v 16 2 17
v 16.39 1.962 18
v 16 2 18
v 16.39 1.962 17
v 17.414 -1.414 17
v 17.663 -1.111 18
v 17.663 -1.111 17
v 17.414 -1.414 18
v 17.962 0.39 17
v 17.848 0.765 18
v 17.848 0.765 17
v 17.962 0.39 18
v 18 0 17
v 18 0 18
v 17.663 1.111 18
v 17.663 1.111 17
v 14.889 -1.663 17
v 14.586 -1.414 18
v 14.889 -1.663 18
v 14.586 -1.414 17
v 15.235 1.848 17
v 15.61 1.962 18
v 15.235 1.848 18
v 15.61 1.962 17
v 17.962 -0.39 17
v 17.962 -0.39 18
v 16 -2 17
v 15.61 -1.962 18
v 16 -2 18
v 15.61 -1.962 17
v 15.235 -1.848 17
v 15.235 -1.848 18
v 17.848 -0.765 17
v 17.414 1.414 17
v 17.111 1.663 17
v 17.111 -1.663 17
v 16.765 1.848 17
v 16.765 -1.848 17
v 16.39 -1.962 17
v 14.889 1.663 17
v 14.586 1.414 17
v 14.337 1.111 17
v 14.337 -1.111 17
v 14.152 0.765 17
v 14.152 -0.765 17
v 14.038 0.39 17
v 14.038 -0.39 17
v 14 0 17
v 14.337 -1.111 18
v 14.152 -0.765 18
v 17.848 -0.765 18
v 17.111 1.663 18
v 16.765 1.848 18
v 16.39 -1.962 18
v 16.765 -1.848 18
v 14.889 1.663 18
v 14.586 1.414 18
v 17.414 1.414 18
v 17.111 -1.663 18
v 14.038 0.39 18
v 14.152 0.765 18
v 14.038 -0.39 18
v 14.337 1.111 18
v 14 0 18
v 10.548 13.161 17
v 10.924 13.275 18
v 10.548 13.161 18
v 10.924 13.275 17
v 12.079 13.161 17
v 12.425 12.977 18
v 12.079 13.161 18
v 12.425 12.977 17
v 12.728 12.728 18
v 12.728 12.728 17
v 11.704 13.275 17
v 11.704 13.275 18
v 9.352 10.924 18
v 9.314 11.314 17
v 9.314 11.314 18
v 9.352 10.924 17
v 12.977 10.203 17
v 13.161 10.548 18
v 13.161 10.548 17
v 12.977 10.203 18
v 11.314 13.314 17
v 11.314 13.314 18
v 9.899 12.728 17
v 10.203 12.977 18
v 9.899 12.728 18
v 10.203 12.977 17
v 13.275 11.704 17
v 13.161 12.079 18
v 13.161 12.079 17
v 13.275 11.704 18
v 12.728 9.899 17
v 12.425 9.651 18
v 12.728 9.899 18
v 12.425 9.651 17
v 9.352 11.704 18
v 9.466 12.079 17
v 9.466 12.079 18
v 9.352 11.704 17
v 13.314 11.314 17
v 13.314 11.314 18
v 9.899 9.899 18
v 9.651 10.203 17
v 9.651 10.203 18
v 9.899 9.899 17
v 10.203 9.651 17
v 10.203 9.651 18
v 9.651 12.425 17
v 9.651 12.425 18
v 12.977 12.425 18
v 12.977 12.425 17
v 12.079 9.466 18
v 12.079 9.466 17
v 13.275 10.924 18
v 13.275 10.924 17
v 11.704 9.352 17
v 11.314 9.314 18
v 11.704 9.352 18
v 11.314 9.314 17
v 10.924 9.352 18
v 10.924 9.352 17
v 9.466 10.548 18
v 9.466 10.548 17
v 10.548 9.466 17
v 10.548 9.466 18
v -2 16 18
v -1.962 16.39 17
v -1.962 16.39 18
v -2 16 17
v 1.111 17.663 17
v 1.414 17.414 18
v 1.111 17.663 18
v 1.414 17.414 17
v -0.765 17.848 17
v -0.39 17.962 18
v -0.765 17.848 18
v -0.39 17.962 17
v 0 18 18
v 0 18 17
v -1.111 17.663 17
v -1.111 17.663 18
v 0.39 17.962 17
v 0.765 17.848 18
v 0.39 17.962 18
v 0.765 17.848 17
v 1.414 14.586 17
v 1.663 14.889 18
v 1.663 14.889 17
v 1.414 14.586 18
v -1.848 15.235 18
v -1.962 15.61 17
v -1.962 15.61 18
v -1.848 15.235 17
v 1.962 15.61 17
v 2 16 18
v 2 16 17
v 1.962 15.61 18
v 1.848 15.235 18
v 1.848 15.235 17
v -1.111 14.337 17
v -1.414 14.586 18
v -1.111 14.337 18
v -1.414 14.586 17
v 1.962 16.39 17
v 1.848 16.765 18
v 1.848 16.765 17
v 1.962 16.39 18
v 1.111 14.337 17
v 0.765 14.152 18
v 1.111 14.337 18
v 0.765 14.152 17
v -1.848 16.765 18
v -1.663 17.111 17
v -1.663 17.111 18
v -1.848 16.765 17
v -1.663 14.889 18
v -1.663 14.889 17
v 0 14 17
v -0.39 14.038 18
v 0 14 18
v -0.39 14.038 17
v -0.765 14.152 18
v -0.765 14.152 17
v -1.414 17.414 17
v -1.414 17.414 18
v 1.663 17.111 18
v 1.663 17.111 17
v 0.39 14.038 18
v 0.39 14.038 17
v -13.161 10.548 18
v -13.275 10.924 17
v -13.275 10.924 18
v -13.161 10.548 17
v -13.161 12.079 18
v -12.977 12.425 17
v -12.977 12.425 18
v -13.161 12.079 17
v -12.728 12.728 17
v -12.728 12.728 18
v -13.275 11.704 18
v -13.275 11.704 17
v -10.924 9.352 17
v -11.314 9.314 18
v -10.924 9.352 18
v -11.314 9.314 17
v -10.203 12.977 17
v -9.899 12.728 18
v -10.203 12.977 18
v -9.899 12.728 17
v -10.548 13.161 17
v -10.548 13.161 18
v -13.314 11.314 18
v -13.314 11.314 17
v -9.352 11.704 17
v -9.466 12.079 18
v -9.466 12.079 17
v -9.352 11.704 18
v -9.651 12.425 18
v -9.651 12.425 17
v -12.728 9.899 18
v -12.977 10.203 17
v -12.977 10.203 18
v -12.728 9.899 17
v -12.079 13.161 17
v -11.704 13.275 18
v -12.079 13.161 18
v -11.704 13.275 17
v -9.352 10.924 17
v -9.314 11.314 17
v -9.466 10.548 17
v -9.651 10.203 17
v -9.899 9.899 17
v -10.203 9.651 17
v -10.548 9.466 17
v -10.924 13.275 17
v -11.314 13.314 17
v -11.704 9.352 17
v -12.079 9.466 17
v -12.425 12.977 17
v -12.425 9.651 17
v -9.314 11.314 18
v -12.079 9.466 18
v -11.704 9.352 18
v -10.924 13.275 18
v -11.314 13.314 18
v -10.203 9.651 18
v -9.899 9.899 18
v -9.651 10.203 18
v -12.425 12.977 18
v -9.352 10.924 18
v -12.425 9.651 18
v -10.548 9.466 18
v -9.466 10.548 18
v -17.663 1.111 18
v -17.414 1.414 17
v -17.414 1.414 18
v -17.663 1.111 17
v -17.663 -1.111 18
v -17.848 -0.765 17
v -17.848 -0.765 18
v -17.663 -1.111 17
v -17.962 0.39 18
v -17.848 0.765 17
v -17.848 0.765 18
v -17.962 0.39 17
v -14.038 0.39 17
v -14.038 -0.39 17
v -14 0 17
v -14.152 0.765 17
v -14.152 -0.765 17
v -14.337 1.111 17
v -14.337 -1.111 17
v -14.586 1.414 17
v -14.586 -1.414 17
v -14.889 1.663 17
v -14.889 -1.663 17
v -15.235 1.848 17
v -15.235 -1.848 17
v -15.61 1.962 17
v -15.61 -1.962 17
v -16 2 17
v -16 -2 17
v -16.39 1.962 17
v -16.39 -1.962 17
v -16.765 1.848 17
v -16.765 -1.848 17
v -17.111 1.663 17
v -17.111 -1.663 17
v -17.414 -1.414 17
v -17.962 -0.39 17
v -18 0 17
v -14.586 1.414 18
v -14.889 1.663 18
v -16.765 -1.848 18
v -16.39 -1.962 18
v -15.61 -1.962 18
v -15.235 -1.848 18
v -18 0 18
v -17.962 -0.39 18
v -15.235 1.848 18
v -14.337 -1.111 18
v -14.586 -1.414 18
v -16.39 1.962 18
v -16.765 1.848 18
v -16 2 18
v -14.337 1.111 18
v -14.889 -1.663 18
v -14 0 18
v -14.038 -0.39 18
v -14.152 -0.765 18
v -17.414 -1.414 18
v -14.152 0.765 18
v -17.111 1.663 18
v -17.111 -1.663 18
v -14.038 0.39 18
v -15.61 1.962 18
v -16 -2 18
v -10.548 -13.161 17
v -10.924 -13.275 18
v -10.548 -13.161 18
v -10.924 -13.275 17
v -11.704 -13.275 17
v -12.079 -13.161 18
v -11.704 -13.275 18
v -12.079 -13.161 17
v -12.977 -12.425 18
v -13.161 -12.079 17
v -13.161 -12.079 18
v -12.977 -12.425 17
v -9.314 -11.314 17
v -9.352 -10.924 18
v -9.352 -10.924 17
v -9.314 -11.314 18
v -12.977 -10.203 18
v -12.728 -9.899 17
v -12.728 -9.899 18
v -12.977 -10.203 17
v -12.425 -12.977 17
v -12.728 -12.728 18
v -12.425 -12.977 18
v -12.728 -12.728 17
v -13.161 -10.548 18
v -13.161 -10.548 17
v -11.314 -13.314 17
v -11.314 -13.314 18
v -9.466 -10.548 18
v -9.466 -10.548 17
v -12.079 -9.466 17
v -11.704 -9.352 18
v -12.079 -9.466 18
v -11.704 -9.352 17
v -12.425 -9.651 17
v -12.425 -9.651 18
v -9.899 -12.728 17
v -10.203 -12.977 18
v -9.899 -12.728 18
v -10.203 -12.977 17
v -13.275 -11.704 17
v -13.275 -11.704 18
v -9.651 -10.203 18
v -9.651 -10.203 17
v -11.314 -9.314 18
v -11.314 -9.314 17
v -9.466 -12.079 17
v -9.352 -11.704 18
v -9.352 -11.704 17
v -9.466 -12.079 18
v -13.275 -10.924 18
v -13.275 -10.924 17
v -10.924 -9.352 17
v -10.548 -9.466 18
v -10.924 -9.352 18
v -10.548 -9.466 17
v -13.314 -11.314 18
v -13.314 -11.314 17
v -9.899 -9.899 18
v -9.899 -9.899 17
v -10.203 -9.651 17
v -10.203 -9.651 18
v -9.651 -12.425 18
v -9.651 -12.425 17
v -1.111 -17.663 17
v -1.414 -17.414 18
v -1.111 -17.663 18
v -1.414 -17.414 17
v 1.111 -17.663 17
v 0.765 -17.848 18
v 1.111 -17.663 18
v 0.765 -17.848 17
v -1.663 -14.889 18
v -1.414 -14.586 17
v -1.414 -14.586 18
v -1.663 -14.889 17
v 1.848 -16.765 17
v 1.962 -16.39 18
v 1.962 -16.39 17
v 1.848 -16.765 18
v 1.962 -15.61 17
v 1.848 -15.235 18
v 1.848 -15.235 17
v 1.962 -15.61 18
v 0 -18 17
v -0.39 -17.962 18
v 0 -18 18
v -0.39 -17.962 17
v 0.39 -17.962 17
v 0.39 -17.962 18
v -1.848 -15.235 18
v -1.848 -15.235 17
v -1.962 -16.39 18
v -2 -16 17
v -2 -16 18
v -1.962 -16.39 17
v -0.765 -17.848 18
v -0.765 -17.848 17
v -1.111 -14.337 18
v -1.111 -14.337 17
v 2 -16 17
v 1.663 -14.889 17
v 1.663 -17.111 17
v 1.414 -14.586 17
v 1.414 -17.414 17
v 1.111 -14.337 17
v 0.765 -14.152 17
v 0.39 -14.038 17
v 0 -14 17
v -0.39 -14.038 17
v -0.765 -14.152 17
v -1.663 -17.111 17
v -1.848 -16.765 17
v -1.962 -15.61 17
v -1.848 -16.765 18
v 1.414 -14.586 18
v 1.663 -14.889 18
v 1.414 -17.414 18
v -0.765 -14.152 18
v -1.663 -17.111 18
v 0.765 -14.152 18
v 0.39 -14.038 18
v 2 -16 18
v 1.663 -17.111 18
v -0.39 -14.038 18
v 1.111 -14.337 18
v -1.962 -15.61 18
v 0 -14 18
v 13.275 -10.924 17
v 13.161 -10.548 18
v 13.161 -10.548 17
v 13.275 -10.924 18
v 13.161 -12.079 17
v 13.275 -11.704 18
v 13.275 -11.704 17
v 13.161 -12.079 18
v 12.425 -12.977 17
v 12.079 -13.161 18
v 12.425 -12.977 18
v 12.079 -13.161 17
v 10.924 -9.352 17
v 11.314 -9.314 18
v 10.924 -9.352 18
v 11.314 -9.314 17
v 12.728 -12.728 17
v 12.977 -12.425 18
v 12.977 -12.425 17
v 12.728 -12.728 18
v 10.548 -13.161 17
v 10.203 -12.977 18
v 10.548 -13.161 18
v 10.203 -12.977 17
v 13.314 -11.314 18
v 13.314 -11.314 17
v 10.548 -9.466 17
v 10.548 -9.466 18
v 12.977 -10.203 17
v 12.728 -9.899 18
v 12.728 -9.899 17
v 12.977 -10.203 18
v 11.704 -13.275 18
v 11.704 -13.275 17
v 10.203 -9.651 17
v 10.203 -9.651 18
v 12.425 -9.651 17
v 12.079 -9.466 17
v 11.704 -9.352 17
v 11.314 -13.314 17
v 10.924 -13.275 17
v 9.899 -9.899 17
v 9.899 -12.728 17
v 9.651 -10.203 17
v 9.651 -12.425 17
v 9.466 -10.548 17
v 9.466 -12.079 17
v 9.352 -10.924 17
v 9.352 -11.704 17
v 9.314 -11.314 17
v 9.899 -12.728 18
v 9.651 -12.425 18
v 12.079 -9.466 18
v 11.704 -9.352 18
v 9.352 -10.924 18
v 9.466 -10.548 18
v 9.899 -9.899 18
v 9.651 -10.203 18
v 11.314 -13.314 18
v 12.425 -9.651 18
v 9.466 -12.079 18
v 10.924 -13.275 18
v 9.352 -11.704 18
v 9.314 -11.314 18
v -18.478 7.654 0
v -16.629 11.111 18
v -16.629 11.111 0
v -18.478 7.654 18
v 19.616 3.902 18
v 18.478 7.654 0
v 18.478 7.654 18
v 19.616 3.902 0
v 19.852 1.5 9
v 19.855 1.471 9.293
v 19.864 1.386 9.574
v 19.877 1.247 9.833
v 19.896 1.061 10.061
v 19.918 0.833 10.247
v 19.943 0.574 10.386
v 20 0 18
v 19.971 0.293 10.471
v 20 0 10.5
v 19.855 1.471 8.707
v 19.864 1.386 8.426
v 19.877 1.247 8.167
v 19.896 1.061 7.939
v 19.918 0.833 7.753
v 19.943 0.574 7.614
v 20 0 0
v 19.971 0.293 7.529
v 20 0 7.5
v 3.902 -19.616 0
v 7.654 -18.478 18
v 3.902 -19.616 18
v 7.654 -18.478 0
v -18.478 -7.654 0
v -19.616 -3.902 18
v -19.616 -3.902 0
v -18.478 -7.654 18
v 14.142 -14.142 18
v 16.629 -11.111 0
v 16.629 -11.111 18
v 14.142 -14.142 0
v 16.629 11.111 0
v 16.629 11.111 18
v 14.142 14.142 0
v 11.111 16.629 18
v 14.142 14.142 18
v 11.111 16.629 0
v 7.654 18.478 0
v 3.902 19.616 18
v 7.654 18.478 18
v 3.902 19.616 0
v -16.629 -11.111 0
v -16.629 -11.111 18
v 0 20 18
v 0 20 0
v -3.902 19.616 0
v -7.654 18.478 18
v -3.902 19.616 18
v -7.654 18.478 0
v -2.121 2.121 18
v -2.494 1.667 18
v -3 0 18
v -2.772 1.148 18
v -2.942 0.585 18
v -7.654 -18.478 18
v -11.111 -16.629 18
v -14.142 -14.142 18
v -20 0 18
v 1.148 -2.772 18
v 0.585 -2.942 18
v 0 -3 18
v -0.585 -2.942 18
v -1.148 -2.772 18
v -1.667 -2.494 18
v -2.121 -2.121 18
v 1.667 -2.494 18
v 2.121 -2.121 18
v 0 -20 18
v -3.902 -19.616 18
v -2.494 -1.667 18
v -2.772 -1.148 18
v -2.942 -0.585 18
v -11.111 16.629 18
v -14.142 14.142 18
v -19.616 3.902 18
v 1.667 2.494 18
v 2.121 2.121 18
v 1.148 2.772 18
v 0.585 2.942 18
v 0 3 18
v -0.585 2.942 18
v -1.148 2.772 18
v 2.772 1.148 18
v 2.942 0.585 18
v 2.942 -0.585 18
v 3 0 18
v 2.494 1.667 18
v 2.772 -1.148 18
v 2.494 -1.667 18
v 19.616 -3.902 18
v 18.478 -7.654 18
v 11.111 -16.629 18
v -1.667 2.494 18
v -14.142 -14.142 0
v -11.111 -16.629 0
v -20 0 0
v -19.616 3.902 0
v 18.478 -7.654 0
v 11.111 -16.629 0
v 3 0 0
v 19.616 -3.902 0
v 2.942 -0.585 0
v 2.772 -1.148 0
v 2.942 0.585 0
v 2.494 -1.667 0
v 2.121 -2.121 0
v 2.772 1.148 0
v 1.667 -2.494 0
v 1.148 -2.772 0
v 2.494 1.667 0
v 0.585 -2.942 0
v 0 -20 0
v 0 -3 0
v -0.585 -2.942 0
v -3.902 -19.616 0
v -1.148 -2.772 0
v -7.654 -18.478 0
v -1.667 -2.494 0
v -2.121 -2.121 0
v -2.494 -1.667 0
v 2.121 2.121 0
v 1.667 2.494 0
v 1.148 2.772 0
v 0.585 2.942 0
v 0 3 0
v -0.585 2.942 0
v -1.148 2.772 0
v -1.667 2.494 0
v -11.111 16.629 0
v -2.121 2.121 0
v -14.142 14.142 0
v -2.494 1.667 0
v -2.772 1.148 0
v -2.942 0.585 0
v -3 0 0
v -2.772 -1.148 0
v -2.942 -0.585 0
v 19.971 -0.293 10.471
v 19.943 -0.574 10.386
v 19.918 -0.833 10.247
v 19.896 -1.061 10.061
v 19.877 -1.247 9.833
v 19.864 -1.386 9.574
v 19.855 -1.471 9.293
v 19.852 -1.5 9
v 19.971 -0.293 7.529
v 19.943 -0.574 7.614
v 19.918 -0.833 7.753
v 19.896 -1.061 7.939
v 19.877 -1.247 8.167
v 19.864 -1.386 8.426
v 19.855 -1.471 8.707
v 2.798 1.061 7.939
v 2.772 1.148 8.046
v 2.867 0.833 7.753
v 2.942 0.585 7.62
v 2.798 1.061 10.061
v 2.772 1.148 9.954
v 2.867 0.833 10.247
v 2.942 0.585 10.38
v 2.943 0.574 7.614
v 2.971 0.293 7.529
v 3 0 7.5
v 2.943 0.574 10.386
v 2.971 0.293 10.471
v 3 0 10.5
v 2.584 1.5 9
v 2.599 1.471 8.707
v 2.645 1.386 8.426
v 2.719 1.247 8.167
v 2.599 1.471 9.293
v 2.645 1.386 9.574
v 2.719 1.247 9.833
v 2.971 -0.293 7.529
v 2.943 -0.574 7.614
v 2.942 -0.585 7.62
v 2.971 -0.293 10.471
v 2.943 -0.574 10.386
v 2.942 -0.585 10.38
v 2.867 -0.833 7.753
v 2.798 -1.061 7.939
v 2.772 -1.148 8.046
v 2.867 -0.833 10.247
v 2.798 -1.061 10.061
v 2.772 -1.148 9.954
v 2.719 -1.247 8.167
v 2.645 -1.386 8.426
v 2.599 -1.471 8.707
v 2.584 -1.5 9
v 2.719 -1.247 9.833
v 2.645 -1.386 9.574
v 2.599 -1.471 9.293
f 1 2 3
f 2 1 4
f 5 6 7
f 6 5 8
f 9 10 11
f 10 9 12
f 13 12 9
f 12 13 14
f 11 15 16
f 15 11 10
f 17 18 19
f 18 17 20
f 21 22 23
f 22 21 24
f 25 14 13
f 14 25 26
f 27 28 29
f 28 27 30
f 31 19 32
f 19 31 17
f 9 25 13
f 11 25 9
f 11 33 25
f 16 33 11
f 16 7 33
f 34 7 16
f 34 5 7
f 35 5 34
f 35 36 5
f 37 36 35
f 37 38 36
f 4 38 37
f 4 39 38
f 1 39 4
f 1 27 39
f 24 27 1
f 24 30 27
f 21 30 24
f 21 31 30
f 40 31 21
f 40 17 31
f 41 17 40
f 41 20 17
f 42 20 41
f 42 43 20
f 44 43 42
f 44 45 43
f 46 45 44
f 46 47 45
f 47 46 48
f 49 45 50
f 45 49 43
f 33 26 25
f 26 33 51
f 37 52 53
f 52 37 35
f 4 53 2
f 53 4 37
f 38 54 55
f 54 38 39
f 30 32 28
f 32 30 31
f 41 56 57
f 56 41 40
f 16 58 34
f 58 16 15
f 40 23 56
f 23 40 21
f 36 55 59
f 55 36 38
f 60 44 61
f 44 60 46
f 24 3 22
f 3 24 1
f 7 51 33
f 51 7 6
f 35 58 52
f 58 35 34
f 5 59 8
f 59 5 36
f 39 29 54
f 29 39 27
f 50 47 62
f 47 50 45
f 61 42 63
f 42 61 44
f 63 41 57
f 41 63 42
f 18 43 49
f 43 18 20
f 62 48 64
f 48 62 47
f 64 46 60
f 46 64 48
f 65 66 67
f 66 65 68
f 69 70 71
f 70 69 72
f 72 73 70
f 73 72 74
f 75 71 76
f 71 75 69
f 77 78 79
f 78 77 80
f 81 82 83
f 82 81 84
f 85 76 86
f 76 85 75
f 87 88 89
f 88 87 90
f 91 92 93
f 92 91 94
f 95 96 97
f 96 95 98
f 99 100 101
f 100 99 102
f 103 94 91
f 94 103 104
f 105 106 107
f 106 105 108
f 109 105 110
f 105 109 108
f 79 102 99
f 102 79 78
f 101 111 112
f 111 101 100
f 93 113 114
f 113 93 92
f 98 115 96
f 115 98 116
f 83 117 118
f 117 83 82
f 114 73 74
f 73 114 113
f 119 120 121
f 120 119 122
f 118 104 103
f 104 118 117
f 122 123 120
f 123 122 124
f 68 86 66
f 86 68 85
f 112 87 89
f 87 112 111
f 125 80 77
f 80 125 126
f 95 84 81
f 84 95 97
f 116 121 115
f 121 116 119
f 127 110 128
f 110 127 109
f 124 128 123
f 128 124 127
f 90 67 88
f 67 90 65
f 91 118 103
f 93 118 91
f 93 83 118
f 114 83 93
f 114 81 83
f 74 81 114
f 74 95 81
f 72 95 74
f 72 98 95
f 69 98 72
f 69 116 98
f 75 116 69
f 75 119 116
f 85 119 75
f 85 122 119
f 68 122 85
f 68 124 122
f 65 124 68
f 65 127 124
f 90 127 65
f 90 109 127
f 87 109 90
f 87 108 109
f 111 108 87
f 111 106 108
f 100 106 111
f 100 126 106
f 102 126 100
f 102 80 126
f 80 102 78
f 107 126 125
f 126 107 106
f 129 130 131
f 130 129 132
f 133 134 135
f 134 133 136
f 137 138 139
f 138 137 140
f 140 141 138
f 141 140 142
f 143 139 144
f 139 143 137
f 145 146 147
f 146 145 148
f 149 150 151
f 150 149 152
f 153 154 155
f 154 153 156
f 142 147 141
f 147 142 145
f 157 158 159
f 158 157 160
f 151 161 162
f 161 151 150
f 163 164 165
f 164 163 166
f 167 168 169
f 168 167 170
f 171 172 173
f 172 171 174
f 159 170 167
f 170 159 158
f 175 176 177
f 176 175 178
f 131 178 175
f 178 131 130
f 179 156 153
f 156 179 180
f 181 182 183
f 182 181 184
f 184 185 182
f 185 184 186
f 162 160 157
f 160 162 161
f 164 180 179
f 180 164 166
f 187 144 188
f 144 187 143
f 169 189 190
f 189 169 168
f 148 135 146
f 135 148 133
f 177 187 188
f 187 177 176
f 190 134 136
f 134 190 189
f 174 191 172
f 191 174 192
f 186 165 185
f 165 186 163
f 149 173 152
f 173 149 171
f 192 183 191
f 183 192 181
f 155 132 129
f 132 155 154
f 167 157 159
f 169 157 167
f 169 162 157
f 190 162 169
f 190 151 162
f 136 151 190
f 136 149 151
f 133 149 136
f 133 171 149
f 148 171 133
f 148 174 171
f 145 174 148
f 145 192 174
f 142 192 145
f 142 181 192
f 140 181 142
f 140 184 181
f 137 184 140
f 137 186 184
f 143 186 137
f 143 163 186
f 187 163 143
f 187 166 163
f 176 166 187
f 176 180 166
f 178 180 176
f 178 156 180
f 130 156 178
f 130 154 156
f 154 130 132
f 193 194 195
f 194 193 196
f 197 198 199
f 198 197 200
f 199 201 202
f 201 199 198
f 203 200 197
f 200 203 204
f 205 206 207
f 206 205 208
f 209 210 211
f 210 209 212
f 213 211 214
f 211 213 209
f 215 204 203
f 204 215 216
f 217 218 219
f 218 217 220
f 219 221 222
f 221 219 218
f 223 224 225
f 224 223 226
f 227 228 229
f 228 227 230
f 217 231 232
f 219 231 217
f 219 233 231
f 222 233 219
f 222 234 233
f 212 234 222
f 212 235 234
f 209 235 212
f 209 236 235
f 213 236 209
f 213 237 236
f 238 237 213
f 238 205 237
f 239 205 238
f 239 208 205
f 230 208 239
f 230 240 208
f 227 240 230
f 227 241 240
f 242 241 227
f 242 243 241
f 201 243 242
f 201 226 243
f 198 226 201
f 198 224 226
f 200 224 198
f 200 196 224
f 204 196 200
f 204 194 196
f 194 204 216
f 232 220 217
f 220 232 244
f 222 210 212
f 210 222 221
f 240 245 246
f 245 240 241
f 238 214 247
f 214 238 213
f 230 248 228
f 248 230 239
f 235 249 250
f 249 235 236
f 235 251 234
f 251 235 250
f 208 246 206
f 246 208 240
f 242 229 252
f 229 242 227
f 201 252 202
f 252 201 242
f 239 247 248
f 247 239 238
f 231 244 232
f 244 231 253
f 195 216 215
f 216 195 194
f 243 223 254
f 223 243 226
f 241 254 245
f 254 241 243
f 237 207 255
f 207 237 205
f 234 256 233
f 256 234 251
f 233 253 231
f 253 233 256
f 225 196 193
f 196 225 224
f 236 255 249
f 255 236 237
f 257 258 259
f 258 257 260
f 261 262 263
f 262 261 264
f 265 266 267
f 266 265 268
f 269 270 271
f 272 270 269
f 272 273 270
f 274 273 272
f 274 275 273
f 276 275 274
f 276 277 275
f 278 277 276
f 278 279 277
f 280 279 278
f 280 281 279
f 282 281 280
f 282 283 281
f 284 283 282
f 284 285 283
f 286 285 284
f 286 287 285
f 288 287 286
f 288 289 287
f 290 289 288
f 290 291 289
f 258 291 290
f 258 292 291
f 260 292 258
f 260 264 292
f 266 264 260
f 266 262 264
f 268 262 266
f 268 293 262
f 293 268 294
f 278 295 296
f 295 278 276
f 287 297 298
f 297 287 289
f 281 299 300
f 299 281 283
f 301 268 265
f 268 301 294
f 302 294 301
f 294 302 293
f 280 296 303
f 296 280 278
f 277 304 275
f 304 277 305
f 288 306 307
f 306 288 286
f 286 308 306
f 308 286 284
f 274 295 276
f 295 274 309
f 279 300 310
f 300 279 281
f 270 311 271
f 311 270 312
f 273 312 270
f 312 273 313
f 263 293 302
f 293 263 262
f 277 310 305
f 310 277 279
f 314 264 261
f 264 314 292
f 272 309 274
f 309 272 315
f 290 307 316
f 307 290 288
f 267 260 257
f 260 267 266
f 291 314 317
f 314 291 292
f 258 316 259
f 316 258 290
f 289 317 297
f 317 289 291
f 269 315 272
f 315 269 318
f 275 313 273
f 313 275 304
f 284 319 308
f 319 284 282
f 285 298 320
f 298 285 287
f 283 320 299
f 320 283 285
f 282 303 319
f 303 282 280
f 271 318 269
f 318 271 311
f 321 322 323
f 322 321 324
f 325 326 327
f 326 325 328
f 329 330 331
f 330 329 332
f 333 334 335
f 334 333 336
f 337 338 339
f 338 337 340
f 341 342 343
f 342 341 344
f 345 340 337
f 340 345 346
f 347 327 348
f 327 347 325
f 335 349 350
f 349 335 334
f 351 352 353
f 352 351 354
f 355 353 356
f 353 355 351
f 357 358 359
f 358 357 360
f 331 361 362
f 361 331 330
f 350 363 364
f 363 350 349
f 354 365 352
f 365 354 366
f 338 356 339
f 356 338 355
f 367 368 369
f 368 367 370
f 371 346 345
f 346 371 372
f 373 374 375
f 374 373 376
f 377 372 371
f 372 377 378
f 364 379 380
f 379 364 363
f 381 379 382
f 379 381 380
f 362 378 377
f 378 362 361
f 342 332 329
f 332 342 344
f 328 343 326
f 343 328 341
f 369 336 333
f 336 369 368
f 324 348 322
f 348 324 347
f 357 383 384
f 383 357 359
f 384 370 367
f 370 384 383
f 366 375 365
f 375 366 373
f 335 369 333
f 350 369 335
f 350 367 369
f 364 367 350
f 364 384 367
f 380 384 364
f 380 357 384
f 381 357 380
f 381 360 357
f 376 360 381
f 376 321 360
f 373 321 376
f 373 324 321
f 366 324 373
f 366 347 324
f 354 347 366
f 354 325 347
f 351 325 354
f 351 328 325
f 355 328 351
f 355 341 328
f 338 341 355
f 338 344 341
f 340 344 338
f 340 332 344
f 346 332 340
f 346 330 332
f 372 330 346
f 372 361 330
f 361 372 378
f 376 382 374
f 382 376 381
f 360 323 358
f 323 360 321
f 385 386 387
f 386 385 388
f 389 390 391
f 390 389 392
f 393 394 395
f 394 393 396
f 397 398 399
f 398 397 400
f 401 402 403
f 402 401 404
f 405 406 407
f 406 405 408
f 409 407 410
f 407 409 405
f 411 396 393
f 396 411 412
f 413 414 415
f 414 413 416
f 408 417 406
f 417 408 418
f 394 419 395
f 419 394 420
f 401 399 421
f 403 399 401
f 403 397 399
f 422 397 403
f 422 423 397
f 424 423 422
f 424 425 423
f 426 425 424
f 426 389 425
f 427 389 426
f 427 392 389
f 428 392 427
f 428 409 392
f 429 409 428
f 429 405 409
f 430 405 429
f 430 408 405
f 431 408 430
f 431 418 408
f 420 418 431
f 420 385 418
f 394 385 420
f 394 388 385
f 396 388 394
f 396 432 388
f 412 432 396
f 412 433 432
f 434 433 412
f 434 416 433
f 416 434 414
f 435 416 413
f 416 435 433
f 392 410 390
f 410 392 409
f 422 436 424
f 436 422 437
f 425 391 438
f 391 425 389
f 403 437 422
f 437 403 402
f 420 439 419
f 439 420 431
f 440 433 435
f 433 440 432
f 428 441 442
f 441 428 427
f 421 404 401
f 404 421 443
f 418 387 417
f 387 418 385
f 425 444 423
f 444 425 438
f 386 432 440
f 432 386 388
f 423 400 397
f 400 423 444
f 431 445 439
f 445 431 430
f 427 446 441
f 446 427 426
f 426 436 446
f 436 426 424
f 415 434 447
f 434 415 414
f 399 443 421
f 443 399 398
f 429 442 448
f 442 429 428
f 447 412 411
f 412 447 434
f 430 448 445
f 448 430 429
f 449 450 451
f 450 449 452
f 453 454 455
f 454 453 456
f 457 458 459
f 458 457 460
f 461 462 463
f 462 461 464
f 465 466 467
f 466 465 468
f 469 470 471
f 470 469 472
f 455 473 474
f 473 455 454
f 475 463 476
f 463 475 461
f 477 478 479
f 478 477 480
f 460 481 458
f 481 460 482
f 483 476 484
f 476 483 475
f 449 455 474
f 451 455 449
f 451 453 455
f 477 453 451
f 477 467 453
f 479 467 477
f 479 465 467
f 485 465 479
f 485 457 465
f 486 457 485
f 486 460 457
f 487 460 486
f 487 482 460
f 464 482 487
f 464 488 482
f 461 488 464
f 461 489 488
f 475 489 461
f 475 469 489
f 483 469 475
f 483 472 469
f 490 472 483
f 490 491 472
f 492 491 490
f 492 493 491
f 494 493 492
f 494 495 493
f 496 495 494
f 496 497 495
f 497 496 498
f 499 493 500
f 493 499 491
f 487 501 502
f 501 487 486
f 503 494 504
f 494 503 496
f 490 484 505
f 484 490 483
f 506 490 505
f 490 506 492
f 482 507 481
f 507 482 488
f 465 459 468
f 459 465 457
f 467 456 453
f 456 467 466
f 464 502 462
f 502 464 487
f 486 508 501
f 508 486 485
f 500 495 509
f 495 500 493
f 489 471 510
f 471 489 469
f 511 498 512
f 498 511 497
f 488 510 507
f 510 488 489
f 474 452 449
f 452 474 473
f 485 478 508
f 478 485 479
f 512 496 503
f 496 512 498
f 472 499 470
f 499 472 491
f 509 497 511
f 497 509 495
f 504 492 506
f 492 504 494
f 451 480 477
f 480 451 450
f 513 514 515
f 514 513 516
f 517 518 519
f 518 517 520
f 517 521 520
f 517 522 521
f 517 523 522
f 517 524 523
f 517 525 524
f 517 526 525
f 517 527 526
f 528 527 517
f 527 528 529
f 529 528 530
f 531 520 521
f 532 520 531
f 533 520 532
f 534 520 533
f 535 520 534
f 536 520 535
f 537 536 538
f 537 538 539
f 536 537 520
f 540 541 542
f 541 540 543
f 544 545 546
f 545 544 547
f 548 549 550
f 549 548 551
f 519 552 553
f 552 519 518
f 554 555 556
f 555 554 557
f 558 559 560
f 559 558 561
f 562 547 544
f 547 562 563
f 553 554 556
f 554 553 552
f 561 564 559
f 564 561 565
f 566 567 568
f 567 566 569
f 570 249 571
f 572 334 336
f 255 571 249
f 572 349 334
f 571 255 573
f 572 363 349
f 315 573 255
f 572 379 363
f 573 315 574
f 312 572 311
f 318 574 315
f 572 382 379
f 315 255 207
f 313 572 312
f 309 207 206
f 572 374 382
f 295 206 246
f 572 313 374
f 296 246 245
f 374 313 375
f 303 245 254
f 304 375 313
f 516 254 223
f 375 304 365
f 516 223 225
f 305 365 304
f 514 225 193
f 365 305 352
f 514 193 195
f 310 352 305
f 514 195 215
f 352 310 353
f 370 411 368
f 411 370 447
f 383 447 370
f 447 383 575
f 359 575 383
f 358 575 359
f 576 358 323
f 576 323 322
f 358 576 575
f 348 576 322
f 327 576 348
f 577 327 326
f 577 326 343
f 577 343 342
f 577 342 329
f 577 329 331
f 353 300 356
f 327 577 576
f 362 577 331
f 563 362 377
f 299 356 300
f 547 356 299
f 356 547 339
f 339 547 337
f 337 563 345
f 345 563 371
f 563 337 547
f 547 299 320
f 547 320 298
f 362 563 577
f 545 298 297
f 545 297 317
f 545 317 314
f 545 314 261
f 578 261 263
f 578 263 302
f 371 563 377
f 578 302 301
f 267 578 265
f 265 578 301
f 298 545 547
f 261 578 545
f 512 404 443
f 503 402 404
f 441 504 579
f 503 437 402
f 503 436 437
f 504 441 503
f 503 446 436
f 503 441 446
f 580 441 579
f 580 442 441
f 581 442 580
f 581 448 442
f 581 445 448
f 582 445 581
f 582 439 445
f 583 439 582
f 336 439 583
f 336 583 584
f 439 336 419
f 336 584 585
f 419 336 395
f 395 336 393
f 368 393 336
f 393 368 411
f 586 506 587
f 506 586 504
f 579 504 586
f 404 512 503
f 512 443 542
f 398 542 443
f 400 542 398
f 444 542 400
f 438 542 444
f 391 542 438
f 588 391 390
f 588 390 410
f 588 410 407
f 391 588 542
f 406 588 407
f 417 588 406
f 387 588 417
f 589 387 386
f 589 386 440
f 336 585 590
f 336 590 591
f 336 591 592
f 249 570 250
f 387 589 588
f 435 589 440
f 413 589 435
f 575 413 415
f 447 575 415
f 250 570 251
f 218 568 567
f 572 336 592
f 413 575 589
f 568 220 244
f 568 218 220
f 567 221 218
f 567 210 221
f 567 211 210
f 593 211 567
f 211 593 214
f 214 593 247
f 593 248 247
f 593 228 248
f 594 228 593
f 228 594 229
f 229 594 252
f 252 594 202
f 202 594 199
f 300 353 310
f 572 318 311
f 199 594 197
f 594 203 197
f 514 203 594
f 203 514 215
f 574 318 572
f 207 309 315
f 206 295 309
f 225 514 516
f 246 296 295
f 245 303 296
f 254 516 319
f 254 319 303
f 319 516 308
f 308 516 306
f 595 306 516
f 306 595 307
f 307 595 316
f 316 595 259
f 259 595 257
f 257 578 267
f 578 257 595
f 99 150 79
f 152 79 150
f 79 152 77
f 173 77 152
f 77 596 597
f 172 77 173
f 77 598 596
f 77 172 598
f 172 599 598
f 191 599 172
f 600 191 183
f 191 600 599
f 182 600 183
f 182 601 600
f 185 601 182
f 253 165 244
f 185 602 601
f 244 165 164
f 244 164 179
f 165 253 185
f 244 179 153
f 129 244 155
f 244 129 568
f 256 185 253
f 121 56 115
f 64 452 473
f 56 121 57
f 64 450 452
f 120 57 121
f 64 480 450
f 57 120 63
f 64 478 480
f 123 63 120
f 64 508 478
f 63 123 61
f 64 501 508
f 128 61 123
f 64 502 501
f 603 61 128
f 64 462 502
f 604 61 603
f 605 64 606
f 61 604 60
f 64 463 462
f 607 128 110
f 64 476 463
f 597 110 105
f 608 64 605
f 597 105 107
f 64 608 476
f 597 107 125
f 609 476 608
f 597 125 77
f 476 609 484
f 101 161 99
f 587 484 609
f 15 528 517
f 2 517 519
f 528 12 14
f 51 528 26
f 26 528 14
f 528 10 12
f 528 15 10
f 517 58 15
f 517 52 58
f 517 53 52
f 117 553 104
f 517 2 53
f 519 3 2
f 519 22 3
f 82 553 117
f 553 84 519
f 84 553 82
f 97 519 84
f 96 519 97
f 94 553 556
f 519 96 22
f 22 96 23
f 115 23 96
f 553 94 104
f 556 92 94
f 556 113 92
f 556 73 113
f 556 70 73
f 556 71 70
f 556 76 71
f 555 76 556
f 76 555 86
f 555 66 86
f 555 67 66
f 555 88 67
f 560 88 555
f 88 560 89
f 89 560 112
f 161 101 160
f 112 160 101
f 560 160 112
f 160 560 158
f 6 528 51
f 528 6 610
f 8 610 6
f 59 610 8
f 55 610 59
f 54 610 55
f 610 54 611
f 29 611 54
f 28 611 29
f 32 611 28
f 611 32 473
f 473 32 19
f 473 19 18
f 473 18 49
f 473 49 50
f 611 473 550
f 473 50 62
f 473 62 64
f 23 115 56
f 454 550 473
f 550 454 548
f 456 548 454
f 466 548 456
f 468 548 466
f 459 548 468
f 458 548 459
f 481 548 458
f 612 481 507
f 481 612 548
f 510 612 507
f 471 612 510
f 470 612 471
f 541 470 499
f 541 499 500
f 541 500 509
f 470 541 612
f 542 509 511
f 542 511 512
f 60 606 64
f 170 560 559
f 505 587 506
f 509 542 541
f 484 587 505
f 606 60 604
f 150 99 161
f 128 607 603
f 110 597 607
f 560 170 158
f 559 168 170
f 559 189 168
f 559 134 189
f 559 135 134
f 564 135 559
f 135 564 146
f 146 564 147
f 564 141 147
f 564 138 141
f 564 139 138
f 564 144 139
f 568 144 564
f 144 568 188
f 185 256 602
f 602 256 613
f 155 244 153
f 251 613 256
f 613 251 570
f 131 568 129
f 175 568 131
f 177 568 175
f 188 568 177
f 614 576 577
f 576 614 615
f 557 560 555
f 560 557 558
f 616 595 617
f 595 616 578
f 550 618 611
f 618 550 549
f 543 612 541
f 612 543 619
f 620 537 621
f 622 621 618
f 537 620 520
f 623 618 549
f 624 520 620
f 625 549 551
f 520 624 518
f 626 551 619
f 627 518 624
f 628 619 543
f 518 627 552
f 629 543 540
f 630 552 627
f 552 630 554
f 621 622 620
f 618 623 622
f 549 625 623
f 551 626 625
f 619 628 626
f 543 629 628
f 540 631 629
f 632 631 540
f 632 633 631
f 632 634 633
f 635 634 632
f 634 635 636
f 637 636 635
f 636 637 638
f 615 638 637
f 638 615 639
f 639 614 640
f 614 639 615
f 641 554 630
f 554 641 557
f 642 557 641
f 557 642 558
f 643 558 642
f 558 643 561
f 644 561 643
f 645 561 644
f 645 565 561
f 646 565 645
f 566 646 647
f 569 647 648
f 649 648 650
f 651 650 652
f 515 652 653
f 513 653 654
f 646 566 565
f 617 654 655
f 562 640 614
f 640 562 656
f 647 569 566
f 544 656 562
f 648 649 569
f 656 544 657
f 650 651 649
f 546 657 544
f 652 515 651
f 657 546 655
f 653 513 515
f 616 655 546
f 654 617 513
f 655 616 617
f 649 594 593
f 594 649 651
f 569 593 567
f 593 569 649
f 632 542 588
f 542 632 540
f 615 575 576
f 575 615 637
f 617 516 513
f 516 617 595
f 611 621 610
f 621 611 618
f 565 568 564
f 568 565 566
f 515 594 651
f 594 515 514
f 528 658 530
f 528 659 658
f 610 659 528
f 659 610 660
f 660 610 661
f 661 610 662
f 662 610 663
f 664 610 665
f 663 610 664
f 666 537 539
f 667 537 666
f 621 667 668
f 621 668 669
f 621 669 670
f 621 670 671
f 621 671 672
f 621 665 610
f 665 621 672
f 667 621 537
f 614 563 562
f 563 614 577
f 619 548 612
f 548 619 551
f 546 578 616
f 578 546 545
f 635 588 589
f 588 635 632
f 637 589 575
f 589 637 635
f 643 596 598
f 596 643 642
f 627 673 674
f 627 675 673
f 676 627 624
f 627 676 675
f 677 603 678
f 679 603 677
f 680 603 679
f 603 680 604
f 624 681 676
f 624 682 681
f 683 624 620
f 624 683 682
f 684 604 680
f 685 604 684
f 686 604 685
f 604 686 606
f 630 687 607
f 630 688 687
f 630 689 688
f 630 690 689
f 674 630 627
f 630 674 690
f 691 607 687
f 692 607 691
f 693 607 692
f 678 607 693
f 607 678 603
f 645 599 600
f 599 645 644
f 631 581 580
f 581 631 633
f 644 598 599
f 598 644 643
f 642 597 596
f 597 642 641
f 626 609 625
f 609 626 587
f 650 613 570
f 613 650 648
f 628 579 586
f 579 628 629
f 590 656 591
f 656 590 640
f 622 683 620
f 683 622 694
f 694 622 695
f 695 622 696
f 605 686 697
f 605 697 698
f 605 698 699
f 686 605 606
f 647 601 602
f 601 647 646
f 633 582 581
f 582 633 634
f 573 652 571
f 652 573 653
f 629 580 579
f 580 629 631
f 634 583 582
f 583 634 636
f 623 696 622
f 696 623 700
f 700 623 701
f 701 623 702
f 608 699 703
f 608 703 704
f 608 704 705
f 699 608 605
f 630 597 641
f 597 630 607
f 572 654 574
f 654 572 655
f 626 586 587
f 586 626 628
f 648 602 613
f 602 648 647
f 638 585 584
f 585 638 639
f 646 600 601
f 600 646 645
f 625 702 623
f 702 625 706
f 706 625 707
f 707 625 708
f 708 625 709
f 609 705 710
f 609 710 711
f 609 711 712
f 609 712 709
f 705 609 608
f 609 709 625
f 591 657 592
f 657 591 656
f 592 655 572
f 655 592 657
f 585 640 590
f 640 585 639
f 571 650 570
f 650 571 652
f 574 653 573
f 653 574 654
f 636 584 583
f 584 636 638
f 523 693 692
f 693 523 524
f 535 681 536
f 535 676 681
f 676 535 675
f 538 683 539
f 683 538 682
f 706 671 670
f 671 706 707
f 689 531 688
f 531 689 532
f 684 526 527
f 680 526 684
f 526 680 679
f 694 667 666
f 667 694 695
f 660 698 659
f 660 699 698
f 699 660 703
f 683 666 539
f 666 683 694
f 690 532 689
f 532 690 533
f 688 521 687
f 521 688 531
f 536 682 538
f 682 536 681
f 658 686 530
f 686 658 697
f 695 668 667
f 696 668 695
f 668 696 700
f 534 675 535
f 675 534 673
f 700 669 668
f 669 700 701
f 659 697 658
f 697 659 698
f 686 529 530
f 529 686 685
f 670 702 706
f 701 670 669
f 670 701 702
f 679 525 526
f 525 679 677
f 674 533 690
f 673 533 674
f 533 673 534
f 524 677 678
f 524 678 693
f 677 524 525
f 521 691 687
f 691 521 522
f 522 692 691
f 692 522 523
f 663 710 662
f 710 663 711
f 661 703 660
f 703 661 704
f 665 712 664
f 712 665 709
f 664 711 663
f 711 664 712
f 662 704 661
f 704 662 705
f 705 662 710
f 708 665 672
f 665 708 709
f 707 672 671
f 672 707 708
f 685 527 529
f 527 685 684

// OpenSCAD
$fn = 32;

// ----------------------------------------------------------------------
// Control knob: dimpled knob
// ----------------------------------------------------------------------

// --- parameters (mm) ---
dimp_d = 4;               // finger dimple diameter
n_dimp = 8;               // number of dimples
dimp_r = 16;              // dimple ring radius
knob_d = 40;              // knob body diameter
knob_h = 18;              // knob body height
bore_d = 6;               // shaft bore diameter
set_d = 3;                // set screw bore diameter

dimp_step = 360 / n_dimp;  // dimple angular step

difference() {
  cylinder(h = knob_h, d = knob_d);
  translate([0, 0, -1]) cylinder(h = knob_h + 2, d = bore_d);
  translate([-1, 0, knob_h / 2]) rotate([0, 90, 0])
    cylinder(h = knob_d / 2 + bore_d / 2 + 2, d = set_d);  for (i = [0 : n_dimp - 1])
    rotate([0, 0, i * dimp_step])
      translate([dimp_r, 0, knob_h - 1])
        cylinder(h = 2, d = dimp_d);
}
